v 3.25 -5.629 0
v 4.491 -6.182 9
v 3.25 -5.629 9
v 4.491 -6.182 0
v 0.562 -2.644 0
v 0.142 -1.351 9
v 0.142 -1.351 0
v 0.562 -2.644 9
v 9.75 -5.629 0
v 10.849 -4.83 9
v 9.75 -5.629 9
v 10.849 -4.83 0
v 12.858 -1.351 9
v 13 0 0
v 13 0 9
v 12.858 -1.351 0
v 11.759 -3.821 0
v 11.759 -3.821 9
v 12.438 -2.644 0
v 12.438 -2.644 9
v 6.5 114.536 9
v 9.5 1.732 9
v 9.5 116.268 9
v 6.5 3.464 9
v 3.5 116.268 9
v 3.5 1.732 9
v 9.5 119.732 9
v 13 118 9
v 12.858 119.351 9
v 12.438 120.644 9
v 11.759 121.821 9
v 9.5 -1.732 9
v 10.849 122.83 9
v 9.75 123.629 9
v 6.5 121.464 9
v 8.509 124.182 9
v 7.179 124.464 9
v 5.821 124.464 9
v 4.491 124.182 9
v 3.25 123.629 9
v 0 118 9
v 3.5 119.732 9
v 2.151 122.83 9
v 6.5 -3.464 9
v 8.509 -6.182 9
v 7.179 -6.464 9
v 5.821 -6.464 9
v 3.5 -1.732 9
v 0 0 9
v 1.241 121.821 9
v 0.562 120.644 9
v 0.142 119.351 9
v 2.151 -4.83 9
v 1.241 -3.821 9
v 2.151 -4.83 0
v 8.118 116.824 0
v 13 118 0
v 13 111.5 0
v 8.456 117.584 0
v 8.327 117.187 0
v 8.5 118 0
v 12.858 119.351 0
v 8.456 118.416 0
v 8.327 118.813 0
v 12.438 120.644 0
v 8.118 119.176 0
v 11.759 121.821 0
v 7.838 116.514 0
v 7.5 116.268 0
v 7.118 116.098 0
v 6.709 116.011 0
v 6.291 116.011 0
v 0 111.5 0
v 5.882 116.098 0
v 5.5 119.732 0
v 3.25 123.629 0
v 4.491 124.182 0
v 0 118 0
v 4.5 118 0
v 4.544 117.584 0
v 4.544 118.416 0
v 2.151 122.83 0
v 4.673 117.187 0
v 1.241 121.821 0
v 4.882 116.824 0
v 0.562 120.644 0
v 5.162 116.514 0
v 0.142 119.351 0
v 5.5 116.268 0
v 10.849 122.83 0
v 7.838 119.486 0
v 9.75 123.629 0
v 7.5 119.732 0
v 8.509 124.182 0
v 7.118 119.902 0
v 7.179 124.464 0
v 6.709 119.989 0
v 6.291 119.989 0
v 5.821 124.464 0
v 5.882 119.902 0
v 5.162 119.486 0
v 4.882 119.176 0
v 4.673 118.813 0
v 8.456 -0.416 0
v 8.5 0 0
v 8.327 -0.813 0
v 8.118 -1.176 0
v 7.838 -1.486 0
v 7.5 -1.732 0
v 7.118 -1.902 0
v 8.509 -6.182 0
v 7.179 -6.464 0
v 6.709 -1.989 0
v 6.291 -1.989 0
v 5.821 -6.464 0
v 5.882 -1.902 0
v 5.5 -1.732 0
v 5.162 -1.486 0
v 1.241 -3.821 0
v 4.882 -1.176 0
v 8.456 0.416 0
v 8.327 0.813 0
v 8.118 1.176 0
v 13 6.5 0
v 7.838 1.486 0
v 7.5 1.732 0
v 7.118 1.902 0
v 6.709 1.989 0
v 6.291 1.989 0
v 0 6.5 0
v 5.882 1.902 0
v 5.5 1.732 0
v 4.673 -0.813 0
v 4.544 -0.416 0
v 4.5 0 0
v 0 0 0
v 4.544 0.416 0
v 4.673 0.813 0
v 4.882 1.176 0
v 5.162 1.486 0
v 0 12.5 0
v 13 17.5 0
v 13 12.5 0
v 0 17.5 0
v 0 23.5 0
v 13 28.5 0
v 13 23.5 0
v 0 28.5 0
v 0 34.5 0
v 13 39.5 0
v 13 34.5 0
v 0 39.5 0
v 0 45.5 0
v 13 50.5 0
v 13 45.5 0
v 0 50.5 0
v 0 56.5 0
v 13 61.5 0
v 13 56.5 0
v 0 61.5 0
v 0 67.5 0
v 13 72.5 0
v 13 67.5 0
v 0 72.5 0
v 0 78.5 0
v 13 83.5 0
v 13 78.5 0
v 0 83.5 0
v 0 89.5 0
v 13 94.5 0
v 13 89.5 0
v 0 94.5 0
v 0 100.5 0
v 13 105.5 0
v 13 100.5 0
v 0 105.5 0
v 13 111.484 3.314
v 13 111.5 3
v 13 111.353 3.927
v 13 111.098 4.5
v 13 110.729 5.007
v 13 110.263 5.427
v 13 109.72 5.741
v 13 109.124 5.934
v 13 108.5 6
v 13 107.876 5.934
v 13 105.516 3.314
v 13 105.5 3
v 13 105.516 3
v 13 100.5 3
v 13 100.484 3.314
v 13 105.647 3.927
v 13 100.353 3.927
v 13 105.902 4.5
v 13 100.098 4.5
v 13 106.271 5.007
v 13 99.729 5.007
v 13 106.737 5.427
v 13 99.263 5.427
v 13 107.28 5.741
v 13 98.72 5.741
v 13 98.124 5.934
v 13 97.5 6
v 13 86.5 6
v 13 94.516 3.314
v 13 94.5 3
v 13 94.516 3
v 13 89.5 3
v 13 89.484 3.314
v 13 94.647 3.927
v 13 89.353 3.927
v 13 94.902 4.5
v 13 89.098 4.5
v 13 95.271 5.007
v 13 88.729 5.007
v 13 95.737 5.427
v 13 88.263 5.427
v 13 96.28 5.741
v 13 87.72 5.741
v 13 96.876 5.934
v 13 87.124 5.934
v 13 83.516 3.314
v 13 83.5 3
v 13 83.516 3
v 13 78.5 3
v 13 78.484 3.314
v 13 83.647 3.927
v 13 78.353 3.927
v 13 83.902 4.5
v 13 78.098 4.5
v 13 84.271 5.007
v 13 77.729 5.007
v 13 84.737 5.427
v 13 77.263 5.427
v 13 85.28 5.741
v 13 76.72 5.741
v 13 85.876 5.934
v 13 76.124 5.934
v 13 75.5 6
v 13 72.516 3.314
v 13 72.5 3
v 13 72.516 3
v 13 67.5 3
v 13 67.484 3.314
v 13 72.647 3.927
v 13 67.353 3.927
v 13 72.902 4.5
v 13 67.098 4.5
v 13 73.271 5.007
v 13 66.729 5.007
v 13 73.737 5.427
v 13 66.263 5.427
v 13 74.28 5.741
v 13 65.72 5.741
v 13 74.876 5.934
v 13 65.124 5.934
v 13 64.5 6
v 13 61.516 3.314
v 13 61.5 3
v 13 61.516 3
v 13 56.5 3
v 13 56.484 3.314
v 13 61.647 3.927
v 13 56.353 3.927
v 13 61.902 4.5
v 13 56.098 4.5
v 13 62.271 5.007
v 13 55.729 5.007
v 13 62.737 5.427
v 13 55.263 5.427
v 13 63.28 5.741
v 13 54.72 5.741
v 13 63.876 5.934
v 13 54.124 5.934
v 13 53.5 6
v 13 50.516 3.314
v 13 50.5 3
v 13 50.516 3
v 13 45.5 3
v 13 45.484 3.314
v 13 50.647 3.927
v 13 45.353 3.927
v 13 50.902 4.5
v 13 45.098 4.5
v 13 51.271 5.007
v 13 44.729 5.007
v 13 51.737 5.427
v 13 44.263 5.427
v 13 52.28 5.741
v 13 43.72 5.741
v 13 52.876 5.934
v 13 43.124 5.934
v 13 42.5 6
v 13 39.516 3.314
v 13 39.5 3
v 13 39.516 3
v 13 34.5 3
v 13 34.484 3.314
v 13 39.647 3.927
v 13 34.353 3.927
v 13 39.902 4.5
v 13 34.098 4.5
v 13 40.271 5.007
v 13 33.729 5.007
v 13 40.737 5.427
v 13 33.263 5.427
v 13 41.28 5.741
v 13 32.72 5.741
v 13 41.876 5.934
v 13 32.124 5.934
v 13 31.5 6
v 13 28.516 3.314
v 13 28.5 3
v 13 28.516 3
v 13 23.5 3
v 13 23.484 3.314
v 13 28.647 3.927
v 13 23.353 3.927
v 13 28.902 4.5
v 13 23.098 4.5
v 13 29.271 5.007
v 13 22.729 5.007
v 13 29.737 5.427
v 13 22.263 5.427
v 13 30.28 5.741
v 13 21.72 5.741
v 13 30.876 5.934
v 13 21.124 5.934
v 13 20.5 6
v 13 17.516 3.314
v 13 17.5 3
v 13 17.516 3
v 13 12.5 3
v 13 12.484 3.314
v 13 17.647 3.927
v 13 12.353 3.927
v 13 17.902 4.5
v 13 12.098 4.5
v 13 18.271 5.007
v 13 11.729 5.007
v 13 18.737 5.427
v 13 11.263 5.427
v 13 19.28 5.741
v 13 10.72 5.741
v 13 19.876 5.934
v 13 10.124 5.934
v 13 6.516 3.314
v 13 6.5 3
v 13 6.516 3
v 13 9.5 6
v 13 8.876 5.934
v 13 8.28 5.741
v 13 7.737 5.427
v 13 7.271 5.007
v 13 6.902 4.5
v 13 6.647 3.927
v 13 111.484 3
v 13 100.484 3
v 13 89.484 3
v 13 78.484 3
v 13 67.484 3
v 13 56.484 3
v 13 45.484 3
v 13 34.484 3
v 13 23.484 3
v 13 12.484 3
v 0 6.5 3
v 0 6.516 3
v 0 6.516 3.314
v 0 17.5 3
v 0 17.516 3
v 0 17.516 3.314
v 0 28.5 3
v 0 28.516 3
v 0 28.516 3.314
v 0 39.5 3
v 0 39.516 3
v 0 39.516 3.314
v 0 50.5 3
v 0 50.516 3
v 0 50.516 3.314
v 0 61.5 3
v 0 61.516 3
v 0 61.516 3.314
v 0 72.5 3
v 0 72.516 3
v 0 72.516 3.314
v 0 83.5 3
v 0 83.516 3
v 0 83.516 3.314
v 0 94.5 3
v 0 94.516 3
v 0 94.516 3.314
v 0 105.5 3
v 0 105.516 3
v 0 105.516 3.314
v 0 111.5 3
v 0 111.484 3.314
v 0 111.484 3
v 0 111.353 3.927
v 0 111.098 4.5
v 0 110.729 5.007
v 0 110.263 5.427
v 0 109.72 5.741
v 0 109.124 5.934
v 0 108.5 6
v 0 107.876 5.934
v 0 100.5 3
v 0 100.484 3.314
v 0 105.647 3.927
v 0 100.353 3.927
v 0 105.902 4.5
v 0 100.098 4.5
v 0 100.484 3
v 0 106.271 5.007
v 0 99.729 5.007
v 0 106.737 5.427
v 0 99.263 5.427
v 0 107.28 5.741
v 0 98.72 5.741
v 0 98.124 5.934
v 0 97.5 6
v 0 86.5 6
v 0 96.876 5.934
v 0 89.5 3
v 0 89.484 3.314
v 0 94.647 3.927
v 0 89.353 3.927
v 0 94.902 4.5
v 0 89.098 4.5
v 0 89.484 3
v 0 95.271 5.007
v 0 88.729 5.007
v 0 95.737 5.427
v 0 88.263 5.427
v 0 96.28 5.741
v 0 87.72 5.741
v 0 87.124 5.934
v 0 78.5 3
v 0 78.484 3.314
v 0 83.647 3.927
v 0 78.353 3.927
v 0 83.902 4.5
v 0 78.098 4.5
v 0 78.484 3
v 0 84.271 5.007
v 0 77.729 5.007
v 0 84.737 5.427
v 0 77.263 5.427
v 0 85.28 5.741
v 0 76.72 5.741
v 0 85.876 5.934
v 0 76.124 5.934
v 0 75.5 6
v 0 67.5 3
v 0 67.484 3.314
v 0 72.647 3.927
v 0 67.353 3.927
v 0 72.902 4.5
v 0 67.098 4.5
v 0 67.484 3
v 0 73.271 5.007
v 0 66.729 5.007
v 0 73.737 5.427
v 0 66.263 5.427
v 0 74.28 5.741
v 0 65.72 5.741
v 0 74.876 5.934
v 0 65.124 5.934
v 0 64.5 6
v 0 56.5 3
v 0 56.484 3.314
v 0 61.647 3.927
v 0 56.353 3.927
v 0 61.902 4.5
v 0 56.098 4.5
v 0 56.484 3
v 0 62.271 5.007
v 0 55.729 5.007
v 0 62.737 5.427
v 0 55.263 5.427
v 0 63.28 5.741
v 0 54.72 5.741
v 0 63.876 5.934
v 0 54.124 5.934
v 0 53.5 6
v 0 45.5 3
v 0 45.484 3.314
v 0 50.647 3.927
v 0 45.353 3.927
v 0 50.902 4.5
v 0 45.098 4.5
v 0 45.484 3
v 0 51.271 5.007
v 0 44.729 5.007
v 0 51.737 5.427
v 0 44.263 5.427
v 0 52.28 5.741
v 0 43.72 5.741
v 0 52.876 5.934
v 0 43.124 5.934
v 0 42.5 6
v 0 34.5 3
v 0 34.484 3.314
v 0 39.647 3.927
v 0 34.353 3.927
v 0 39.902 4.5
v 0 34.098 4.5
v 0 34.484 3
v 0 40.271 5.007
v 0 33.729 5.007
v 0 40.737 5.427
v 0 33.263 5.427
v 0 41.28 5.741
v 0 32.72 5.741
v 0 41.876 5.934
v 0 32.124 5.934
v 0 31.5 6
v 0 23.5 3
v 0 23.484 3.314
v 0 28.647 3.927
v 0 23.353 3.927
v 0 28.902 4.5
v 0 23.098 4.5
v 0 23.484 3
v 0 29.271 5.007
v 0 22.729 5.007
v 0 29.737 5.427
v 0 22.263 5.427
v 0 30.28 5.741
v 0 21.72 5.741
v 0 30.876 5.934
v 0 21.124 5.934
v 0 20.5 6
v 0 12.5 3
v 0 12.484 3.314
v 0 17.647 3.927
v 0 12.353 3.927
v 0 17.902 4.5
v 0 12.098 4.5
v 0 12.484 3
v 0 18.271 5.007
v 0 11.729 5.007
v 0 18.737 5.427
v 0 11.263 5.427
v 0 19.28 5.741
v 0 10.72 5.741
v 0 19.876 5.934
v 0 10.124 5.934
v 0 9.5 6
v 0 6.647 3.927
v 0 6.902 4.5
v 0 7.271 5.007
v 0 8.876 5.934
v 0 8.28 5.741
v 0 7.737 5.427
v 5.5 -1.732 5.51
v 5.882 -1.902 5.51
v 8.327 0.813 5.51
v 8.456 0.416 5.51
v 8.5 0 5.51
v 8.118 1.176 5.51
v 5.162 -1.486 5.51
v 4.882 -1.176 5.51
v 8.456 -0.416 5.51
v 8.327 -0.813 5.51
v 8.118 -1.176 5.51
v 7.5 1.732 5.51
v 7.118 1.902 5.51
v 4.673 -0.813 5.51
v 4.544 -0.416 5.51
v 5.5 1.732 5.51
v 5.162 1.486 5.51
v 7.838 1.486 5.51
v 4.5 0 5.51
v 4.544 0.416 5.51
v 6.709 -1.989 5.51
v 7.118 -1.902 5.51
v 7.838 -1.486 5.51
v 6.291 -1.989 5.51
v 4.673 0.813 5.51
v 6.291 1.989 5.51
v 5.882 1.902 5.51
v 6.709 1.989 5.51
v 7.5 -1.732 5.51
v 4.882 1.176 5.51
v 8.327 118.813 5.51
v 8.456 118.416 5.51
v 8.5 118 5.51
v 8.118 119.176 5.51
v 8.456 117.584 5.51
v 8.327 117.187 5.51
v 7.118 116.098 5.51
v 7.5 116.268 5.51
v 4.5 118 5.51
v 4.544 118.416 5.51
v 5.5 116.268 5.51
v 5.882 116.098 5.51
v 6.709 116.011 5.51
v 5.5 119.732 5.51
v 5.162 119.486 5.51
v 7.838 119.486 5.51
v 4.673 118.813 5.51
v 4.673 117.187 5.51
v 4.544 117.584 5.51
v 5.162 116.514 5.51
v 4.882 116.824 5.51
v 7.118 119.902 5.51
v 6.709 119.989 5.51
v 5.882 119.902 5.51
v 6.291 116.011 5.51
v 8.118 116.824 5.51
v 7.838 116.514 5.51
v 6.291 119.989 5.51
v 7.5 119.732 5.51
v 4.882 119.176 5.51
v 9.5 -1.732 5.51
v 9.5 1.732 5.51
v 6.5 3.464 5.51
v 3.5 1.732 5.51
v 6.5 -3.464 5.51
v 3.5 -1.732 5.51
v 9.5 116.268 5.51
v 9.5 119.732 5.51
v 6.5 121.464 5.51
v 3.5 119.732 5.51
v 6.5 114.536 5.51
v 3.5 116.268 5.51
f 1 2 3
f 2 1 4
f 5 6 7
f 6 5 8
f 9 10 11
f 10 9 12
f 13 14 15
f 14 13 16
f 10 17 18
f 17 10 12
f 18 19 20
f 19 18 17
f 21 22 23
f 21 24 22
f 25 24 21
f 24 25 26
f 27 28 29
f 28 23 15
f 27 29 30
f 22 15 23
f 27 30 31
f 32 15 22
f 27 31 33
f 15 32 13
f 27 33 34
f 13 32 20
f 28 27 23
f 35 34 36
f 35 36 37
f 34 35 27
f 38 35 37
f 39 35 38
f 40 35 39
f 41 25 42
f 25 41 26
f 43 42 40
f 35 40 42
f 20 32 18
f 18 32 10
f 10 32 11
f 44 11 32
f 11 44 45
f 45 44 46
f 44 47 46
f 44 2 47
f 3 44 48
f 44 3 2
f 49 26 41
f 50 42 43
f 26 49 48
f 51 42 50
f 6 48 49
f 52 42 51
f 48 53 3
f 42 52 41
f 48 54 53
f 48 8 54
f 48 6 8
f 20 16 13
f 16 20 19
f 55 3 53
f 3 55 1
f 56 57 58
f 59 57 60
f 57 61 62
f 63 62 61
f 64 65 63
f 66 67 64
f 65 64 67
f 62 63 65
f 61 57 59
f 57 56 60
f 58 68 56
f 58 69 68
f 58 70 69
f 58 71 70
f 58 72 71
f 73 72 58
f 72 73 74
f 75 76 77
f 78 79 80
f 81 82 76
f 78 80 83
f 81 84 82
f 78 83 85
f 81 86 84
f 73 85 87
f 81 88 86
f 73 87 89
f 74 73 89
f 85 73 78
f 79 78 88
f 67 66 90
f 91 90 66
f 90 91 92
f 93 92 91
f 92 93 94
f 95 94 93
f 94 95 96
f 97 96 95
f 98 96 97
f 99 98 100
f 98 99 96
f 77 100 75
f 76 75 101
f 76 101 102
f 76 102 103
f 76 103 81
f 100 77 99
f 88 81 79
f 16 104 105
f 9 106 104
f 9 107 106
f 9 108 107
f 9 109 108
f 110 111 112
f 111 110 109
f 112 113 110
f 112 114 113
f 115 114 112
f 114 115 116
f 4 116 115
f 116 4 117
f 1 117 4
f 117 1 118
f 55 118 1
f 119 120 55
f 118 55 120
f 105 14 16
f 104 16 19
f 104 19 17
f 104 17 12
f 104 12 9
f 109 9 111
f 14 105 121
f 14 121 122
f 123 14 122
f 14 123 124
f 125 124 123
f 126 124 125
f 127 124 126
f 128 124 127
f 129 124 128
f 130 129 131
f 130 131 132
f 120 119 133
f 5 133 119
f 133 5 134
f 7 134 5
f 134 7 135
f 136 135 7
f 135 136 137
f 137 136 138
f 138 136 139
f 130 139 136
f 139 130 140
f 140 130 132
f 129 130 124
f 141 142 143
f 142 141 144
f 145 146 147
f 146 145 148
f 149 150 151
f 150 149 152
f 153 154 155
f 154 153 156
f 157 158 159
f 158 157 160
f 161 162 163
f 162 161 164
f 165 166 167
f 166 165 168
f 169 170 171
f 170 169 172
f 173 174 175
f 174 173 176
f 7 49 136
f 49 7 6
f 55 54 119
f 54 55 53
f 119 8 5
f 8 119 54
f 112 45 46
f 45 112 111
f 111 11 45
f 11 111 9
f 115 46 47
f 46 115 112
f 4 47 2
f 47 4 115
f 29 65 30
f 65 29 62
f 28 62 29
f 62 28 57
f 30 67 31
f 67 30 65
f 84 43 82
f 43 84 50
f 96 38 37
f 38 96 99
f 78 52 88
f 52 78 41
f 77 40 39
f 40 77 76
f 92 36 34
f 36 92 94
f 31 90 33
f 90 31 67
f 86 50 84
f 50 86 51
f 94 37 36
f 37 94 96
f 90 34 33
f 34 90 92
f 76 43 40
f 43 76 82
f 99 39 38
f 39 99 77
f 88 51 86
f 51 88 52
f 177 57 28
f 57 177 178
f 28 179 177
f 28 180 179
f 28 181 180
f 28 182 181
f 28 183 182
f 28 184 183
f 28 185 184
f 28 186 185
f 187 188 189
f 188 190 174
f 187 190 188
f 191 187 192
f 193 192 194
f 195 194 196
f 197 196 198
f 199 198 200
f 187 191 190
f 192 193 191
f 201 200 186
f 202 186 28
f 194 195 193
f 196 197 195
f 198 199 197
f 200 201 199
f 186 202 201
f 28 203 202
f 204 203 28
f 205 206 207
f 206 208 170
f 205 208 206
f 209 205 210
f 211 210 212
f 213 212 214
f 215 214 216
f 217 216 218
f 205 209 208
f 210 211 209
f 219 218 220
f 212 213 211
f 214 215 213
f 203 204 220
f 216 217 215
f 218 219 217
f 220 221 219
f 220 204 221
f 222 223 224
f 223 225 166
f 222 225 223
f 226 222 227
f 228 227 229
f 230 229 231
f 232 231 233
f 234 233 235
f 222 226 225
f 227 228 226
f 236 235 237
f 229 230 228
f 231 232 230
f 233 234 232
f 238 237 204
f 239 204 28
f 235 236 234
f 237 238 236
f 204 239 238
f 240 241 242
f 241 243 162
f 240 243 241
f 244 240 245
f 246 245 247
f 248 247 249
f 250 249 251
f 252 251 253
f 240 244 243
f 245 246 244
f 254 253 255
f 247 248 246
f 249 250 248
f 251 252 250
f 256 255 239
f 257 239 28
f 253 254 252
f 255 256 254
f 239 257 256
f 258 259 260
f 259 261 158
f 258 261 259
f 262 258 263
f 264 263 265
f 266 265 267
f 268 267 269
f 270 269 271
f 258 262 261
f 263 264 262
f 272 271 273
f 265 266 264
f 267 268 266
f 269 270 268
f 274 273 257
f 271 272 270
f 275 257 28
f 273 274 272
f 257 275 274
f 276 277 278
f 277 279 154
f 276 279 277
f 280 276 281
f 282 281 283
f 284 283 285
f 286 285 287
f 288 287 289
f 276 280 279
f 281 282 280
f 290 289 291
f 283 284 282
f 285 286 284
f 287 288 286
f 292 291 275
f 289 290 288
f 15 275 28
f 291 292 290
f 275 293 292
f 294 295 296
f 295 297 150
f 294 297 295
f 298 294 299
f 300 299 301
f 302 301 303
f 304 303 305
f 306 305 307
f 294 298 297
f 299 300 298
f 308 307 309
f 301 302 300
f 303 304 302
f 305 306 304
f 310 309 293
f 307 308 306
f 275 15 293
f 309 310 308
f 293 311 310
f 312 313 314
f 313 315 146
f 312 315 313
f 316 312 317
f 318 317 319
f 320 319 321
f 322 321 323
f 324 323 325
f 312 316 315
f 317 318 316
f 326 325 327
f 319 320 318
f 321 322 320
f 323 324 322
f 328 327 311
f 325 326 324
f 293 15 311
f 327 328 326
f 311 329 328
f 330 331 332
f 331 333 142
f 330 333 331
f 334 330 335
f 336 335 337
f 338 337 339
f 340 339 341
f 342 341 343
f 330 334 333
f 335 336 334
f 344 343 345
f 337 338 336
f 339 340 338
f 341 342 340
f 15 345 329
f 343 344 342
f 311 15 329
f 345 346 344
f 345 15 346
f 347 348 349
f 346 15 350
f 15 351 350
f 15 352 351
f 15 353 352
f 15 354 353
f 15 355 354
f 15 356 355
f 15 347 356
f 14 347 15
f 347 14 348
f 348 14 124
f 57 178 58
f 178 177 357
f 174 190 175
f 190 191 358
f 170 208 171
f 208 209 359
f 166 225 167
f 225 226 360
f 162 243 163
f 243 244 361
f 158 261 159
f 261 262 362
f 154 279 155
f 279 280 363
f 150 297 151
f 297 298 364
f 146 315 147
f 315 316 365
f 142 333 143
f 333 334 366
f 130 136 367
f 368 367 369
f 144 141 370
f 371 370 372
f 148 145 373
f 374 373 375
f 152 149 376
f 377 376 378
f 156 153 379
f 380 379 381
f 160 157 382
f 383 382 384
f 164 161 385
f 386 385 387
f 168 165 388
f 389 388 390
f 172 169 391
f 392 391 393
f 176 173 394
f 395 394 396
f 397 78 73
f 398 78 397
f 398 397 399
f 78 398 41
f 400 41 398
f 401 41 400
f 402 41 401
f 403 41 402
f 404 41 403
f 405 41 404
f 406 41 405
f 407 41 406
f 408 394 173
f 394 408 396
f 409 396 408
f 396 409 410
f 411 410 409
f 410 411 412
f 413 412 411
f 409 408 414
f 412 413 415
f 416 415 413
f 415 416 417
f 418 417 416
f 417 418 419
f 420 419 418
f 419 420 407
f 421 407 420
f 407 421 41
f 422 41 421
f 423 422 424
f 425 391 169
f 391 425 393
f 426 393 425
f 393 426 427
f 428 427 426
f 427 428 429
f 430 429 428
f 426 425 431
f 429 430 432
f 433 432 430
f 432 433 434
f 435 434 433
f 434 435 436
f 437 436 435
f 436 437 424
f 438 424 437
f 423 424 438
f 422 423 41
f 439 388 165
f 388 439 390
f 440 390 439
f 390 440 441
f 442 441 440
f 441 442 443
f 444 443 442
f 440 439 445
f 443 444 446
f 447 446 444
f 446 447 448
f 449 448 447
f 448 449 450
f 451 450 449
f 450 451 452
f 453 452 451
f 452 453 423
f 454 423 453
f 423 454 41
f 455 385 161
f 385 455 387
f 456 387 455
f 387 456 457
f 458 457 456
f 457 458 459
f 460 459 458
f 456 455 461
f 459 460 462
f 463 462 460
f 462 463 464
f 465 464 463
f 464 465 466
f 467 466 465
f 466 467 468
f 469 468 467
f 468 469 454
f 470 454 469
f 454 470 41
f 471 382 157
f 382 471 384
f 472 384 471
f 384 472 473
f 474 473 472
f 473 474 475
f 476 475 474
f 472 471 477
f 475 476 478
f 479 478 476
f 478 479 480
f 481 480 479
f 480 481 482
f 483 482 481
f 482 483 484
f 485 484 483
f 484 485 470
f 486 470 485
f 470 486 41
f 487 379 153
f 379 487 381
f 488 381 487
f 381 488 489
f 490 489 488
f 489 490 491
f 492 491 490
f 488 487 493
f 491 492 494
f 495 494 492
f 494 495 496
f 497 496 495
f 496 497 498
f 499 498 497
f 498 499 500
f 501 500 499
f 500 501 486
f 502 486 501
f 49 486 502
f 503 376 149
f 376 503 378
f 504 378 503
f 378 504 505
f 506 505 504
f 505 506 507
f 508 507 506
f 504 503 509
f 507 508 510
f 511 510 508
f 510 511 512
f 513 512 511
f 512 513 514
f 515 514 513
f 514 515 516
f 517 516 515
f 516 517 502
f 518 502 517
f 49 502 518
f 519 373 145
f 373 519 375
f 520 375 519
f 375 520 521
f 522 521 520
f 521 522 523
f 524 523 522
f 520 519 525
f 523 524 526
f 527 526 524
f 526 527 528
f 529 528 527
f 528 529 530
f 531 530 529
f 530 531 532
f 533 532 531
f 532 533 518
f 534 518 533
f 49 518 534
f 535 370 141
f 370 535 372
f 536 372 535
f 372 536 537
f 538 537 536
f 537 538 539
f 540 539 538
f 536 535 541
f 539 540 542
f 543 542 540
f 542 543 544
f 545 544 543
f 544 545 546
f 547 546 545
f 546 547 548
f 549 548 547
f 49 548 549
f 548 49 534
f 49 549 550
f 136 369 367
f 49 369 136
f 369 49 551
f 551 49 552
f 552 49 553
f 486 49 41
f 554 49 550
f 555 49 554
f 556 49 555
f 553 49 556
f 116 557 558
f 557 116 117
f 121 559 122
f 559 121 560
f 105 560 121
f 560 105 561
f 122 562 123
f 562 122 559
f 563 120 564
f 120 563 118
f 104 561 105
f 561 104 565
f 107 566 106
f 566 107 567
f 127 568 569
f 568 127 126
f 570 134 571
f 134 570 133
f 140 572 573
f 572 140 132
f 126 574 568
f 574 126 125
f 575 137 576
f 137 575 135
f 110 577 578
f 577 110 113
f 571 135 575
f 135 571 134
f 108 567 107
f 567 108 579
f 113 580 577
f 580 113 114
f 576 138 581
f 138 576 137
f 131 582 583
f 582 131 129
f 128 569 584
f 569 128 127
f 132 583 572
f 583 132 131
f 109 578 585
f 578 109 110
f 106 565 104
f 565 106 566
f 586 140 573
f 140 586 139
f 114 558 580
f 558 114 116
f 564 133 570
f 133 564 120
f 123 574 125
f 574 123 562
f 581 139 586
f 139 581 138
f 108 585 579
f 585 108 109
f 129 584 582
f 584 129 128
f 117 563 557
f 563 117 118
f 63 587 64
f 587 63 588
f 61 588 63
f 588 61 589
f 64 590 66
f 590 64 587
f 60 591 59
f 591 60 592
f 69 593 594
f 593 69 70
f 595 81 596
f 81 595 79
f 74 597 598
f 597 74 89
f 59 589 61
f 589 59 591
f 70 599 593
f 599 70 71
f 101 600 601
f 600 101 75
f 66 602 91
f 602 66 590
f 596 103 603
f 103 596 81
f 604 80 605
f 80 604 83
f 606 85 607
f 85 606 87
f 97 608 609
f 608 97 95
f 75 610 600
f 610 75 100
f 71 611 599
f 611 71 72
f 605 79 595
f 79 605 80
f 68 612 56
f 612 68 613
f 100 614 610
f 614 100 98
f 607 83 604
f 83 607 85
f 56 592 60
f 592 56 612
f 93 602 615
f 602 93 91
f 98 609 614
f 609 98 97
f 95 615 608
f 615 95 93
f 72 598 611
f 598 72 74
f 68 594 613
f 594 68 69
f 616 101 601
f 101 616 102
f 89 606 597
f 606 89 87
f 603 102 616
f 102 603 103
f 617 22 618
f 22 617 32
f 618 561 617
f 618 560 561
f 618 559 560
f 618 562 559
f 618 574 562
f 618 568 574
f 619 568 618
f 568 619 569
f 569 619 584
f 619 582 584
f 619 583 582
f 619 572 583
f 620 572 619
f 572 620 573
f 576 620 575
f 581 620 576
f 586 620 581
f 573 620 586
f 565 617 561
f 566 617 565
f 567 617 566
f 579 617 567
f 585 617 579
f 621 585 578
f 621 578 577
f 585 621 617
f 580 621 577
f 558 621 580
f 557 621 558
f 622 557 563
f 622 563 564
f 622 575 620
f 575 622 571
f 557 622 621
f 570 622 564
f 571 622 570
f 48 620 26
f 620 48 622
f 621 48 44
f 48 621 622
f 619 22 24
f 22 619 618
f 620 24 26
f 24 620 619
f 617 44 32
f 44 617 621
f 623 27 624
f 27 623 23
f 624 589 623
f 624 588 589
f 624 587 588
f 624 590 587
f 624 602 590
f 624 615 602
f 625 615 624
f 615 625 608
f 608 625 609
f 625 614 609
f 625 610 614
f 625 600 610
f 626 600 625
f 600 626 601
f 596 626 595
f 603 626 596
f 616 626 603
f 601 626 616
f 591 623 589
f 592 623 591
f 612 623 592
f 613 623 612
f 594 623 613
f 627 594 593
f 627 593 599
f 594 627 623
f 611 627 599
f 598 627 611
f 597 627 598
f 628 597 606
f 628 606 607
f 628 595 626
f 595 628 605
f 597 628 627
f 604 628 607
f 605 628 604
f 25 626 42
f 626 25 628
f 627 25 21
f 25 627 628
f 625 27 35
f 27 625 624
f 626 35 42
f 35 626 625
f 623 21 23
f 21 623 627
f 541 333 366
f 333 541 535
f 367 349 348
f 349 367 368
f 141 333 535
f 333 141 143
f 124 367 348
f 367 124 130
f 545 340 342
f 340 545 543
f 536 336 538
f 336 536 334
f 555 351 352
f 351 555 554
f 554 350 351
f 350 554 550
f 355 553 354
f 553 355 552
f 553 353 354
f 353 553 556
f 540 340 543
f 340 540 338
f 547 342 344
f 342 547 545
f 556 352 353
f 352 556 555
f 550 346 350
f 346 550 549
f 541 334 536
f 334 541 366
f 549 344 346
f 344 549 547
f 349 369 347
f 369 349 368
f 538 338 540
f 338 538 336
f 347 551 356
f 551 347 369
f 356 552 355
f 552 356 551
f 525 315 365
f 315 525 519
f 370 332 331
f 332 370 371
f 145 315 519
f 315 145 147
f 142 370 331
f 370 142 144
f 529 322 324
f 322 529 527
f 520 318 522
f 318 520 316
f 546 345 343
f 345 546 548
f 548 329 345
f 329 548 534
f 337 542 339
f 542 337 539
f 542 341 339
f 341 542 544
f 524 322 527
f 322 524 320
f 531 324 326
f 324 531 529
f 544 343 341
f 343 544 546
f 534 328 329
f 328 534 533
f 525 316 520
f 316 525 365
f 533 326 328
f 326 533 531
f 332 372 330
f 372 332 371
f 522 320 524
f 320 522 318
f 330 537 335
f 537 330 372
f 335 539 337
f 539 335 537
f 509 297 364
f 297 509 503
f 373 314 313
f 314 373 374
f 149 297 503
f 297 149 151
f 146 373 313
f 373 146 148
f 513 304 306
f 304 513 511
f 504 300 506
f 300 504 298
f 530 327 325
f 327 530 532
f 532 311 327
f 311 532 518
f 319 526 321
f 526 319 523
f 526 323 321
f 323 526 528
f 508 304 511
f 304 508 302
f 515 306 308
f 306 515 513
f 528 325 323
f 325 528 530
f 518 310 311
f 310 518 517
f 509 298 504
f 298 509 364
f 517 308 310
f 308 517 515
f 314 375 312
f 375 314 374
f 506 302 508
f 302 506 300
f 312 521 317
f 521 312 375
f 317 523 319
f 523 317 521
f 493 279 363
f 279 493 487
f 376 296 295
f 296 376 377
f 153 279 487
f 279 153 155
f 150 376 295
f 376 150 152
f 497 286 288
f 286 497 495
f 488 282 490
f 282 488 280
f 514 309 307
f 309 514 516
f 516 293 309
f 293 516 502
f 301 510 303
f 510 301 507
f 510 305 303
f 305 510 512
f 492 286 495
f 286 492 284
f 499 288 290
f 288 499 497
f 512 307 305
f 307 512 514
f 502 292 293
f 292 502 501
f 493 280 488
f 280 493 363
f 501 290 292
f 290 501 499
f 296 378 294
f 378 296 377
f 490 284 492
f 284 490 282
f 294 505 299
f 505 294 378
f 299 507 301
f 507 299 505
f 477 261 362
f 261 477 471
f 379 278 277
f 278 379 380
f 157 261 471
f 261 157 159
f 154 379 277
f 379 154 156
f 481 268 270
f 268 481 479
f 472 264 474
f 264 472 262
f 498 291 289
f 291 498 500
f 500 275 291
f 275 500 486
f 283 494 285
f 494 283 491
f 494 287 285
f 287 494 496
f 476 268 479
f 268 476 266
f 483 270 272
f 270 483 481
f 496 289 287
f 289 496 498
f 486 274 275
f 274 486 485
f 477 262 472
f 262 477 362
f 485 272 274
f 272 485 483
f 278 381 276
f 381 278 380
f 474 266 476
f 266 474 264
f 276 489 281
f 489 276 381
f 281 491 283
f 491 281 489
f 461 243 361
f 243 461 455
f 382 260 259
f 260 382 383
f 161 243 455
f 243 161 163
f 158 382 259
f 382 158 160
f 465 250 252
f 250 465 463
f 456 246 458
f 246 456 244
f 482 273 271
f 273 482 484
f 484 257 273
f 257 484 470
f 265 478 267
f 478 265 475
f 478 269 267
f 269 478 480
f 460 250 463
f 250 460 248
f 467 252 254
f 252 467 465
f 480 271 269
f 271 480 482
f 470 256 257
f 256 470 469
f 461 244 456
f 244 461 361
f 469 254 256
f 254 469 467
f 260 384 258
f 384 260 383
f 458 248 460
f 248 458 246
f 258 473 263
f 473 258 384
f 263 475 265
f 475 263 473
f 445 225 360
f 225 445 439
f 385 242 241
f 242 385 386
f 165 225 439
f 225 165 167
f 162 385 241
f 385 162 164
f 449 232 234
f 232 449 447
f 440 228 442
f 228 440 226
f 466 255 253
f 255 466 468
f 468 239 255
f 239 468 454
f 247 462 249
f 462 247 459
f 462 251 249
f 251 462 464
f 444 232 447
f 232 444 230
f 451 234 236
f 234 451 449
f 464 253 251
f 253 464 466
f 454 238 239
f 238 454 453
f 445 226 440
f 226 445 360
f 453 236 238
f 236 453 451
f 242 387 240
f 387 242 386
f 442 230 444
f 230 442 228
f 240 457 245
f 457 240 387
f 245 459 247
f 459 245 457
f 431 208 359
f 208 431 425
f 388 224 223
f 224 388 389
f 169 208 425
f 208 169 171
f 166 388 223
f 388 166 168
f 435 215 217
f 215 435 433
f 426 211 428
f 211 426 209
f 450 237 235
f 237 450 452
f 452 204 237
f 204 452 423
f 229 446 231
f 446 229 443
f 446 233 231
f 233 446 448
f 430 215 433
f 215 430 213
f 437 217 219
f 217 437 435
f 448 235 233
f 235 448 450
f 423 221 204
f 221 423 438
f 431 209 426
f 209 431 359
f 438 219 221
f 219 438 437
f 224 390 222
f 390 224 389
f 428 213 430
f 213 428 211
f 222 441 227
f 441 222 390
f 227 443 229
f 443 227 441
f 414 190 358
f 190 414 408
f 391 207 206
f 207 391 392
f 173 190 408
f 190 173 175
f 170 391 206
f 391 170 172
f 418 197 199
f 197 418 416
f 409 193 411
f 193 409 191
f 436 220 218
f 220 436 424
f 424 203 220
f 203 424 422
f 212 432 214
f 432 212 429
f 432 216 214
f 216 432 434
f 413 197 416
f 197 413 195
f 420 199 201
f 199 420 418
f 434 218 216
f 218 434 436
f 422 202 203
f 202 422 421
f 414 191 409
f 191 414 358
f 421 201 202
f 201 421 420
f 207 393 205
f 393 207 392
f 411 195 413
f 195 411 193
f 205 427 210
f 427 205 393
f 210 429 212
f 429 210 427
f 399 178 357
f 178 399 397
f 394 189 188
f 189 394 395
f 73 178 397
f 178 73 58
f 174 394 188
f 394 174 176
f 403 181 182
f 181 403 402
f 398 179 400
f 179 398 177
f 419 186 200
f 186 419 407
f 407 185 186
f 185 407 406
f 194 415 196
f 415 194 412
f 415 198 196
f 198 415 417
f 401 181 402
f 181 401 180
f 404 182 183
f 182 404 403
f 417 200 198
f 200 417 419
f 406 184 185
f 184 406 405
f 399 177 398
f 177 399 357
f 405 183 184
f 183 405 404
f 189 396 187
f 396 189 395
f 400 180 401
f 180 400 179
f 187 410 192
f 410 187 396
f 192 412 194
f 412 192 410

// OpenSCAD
//Resolution of the curves.(Higher = more polygons and higher load time)
$fn = 30;
//What would you like the width to be?(mm)
widthOfBody     = 13;
//What would you like the height to be?(mm)
heightOfBody    = 9;
//How many slots do you want?(int)
numberOfSlots   = 10;
//How wide should the slots be?(mm)
widthOfSlots    = 6;
//How wide should the screw hole be?(mm)
widthOfScrew    = 4;
//How wide do you want the seperating walls?(mm)
widthOfWalls    = 5;

module Hexagon(cle,h)
{
	angle = 360/6;		// 6 pans
	cote = cle * cot(angle);
	echo(angle, cot(angle), cote);
	echo(acos(.6));

	union()
	{
		rotate([0,0,0])
			cube([cle,cote,h],center=true);
		rotate([0,0,angle])
			cube([cle,cote,h],center=true);
		rotate([0,0,2*angle])
			cube([cle,cote,h],center=true);
	}
}

function cot(x)=1/tan(x);



lengthOfBody    = (widthOfBody) + ( widthOfSlots * numberOfSlots ) + ( widthOfWalls * ( numberOfSlots - 1 ) );
difference(){
    union(){
        cube([widthOfBody, lengthOfBody, heightOfBody]);
        translate([ widthOfBody / 2, 0, 0]){
            cylinder( d = widthOfBody, h = heightOfBody );
            translate([ 0, lengthOfBody, 0]){
                cylinder( d = widthOfBody, h = heightOfBody );
            }
        }
    }
    union(){
        translate([ widthOfBody / 2, 0, -1 ]){
            cylinder( d = widthOfScrew, h = heightOfBody + 2 );
            translate([ 0, lengthOfBody, 0]){
                cylinder( d = widthOfScrew, h = heightOfBody + 2 );
            }
        }
        translate([ widthOfBody / 2, 0, heightOfBody - ( heightOfBody / 6 ) + 0.01]){
            Hexagon(cle=6,h=4);
            translate([ 0, lengthOfBody, 0]){
                Hexagon(cle=6,h=4);
            }
        }
        for( i = [ 1 : numberOfSlots ] ){
            translate([-1, ( ( widthOfBody / 2 ) ) + ( ( i - 1 ) * widthOfWalls ) + ( ( i - 1) * widthOfSlots ),-1]){
                cube( [ 2 + widthOfBody, widthOfSlots, 1 + ( widthOfSlots / 2 ) ] );
                
                translate([0, widthOfSlots / 2, widthOfSlots / 1.5]){
                    rotate( a = [ 0, 90, 0 ] ){
                        cylinder( d = widthOfSlots, h = 2 + widthOfBody );
                    }
                }
            }
        }
    }
}
